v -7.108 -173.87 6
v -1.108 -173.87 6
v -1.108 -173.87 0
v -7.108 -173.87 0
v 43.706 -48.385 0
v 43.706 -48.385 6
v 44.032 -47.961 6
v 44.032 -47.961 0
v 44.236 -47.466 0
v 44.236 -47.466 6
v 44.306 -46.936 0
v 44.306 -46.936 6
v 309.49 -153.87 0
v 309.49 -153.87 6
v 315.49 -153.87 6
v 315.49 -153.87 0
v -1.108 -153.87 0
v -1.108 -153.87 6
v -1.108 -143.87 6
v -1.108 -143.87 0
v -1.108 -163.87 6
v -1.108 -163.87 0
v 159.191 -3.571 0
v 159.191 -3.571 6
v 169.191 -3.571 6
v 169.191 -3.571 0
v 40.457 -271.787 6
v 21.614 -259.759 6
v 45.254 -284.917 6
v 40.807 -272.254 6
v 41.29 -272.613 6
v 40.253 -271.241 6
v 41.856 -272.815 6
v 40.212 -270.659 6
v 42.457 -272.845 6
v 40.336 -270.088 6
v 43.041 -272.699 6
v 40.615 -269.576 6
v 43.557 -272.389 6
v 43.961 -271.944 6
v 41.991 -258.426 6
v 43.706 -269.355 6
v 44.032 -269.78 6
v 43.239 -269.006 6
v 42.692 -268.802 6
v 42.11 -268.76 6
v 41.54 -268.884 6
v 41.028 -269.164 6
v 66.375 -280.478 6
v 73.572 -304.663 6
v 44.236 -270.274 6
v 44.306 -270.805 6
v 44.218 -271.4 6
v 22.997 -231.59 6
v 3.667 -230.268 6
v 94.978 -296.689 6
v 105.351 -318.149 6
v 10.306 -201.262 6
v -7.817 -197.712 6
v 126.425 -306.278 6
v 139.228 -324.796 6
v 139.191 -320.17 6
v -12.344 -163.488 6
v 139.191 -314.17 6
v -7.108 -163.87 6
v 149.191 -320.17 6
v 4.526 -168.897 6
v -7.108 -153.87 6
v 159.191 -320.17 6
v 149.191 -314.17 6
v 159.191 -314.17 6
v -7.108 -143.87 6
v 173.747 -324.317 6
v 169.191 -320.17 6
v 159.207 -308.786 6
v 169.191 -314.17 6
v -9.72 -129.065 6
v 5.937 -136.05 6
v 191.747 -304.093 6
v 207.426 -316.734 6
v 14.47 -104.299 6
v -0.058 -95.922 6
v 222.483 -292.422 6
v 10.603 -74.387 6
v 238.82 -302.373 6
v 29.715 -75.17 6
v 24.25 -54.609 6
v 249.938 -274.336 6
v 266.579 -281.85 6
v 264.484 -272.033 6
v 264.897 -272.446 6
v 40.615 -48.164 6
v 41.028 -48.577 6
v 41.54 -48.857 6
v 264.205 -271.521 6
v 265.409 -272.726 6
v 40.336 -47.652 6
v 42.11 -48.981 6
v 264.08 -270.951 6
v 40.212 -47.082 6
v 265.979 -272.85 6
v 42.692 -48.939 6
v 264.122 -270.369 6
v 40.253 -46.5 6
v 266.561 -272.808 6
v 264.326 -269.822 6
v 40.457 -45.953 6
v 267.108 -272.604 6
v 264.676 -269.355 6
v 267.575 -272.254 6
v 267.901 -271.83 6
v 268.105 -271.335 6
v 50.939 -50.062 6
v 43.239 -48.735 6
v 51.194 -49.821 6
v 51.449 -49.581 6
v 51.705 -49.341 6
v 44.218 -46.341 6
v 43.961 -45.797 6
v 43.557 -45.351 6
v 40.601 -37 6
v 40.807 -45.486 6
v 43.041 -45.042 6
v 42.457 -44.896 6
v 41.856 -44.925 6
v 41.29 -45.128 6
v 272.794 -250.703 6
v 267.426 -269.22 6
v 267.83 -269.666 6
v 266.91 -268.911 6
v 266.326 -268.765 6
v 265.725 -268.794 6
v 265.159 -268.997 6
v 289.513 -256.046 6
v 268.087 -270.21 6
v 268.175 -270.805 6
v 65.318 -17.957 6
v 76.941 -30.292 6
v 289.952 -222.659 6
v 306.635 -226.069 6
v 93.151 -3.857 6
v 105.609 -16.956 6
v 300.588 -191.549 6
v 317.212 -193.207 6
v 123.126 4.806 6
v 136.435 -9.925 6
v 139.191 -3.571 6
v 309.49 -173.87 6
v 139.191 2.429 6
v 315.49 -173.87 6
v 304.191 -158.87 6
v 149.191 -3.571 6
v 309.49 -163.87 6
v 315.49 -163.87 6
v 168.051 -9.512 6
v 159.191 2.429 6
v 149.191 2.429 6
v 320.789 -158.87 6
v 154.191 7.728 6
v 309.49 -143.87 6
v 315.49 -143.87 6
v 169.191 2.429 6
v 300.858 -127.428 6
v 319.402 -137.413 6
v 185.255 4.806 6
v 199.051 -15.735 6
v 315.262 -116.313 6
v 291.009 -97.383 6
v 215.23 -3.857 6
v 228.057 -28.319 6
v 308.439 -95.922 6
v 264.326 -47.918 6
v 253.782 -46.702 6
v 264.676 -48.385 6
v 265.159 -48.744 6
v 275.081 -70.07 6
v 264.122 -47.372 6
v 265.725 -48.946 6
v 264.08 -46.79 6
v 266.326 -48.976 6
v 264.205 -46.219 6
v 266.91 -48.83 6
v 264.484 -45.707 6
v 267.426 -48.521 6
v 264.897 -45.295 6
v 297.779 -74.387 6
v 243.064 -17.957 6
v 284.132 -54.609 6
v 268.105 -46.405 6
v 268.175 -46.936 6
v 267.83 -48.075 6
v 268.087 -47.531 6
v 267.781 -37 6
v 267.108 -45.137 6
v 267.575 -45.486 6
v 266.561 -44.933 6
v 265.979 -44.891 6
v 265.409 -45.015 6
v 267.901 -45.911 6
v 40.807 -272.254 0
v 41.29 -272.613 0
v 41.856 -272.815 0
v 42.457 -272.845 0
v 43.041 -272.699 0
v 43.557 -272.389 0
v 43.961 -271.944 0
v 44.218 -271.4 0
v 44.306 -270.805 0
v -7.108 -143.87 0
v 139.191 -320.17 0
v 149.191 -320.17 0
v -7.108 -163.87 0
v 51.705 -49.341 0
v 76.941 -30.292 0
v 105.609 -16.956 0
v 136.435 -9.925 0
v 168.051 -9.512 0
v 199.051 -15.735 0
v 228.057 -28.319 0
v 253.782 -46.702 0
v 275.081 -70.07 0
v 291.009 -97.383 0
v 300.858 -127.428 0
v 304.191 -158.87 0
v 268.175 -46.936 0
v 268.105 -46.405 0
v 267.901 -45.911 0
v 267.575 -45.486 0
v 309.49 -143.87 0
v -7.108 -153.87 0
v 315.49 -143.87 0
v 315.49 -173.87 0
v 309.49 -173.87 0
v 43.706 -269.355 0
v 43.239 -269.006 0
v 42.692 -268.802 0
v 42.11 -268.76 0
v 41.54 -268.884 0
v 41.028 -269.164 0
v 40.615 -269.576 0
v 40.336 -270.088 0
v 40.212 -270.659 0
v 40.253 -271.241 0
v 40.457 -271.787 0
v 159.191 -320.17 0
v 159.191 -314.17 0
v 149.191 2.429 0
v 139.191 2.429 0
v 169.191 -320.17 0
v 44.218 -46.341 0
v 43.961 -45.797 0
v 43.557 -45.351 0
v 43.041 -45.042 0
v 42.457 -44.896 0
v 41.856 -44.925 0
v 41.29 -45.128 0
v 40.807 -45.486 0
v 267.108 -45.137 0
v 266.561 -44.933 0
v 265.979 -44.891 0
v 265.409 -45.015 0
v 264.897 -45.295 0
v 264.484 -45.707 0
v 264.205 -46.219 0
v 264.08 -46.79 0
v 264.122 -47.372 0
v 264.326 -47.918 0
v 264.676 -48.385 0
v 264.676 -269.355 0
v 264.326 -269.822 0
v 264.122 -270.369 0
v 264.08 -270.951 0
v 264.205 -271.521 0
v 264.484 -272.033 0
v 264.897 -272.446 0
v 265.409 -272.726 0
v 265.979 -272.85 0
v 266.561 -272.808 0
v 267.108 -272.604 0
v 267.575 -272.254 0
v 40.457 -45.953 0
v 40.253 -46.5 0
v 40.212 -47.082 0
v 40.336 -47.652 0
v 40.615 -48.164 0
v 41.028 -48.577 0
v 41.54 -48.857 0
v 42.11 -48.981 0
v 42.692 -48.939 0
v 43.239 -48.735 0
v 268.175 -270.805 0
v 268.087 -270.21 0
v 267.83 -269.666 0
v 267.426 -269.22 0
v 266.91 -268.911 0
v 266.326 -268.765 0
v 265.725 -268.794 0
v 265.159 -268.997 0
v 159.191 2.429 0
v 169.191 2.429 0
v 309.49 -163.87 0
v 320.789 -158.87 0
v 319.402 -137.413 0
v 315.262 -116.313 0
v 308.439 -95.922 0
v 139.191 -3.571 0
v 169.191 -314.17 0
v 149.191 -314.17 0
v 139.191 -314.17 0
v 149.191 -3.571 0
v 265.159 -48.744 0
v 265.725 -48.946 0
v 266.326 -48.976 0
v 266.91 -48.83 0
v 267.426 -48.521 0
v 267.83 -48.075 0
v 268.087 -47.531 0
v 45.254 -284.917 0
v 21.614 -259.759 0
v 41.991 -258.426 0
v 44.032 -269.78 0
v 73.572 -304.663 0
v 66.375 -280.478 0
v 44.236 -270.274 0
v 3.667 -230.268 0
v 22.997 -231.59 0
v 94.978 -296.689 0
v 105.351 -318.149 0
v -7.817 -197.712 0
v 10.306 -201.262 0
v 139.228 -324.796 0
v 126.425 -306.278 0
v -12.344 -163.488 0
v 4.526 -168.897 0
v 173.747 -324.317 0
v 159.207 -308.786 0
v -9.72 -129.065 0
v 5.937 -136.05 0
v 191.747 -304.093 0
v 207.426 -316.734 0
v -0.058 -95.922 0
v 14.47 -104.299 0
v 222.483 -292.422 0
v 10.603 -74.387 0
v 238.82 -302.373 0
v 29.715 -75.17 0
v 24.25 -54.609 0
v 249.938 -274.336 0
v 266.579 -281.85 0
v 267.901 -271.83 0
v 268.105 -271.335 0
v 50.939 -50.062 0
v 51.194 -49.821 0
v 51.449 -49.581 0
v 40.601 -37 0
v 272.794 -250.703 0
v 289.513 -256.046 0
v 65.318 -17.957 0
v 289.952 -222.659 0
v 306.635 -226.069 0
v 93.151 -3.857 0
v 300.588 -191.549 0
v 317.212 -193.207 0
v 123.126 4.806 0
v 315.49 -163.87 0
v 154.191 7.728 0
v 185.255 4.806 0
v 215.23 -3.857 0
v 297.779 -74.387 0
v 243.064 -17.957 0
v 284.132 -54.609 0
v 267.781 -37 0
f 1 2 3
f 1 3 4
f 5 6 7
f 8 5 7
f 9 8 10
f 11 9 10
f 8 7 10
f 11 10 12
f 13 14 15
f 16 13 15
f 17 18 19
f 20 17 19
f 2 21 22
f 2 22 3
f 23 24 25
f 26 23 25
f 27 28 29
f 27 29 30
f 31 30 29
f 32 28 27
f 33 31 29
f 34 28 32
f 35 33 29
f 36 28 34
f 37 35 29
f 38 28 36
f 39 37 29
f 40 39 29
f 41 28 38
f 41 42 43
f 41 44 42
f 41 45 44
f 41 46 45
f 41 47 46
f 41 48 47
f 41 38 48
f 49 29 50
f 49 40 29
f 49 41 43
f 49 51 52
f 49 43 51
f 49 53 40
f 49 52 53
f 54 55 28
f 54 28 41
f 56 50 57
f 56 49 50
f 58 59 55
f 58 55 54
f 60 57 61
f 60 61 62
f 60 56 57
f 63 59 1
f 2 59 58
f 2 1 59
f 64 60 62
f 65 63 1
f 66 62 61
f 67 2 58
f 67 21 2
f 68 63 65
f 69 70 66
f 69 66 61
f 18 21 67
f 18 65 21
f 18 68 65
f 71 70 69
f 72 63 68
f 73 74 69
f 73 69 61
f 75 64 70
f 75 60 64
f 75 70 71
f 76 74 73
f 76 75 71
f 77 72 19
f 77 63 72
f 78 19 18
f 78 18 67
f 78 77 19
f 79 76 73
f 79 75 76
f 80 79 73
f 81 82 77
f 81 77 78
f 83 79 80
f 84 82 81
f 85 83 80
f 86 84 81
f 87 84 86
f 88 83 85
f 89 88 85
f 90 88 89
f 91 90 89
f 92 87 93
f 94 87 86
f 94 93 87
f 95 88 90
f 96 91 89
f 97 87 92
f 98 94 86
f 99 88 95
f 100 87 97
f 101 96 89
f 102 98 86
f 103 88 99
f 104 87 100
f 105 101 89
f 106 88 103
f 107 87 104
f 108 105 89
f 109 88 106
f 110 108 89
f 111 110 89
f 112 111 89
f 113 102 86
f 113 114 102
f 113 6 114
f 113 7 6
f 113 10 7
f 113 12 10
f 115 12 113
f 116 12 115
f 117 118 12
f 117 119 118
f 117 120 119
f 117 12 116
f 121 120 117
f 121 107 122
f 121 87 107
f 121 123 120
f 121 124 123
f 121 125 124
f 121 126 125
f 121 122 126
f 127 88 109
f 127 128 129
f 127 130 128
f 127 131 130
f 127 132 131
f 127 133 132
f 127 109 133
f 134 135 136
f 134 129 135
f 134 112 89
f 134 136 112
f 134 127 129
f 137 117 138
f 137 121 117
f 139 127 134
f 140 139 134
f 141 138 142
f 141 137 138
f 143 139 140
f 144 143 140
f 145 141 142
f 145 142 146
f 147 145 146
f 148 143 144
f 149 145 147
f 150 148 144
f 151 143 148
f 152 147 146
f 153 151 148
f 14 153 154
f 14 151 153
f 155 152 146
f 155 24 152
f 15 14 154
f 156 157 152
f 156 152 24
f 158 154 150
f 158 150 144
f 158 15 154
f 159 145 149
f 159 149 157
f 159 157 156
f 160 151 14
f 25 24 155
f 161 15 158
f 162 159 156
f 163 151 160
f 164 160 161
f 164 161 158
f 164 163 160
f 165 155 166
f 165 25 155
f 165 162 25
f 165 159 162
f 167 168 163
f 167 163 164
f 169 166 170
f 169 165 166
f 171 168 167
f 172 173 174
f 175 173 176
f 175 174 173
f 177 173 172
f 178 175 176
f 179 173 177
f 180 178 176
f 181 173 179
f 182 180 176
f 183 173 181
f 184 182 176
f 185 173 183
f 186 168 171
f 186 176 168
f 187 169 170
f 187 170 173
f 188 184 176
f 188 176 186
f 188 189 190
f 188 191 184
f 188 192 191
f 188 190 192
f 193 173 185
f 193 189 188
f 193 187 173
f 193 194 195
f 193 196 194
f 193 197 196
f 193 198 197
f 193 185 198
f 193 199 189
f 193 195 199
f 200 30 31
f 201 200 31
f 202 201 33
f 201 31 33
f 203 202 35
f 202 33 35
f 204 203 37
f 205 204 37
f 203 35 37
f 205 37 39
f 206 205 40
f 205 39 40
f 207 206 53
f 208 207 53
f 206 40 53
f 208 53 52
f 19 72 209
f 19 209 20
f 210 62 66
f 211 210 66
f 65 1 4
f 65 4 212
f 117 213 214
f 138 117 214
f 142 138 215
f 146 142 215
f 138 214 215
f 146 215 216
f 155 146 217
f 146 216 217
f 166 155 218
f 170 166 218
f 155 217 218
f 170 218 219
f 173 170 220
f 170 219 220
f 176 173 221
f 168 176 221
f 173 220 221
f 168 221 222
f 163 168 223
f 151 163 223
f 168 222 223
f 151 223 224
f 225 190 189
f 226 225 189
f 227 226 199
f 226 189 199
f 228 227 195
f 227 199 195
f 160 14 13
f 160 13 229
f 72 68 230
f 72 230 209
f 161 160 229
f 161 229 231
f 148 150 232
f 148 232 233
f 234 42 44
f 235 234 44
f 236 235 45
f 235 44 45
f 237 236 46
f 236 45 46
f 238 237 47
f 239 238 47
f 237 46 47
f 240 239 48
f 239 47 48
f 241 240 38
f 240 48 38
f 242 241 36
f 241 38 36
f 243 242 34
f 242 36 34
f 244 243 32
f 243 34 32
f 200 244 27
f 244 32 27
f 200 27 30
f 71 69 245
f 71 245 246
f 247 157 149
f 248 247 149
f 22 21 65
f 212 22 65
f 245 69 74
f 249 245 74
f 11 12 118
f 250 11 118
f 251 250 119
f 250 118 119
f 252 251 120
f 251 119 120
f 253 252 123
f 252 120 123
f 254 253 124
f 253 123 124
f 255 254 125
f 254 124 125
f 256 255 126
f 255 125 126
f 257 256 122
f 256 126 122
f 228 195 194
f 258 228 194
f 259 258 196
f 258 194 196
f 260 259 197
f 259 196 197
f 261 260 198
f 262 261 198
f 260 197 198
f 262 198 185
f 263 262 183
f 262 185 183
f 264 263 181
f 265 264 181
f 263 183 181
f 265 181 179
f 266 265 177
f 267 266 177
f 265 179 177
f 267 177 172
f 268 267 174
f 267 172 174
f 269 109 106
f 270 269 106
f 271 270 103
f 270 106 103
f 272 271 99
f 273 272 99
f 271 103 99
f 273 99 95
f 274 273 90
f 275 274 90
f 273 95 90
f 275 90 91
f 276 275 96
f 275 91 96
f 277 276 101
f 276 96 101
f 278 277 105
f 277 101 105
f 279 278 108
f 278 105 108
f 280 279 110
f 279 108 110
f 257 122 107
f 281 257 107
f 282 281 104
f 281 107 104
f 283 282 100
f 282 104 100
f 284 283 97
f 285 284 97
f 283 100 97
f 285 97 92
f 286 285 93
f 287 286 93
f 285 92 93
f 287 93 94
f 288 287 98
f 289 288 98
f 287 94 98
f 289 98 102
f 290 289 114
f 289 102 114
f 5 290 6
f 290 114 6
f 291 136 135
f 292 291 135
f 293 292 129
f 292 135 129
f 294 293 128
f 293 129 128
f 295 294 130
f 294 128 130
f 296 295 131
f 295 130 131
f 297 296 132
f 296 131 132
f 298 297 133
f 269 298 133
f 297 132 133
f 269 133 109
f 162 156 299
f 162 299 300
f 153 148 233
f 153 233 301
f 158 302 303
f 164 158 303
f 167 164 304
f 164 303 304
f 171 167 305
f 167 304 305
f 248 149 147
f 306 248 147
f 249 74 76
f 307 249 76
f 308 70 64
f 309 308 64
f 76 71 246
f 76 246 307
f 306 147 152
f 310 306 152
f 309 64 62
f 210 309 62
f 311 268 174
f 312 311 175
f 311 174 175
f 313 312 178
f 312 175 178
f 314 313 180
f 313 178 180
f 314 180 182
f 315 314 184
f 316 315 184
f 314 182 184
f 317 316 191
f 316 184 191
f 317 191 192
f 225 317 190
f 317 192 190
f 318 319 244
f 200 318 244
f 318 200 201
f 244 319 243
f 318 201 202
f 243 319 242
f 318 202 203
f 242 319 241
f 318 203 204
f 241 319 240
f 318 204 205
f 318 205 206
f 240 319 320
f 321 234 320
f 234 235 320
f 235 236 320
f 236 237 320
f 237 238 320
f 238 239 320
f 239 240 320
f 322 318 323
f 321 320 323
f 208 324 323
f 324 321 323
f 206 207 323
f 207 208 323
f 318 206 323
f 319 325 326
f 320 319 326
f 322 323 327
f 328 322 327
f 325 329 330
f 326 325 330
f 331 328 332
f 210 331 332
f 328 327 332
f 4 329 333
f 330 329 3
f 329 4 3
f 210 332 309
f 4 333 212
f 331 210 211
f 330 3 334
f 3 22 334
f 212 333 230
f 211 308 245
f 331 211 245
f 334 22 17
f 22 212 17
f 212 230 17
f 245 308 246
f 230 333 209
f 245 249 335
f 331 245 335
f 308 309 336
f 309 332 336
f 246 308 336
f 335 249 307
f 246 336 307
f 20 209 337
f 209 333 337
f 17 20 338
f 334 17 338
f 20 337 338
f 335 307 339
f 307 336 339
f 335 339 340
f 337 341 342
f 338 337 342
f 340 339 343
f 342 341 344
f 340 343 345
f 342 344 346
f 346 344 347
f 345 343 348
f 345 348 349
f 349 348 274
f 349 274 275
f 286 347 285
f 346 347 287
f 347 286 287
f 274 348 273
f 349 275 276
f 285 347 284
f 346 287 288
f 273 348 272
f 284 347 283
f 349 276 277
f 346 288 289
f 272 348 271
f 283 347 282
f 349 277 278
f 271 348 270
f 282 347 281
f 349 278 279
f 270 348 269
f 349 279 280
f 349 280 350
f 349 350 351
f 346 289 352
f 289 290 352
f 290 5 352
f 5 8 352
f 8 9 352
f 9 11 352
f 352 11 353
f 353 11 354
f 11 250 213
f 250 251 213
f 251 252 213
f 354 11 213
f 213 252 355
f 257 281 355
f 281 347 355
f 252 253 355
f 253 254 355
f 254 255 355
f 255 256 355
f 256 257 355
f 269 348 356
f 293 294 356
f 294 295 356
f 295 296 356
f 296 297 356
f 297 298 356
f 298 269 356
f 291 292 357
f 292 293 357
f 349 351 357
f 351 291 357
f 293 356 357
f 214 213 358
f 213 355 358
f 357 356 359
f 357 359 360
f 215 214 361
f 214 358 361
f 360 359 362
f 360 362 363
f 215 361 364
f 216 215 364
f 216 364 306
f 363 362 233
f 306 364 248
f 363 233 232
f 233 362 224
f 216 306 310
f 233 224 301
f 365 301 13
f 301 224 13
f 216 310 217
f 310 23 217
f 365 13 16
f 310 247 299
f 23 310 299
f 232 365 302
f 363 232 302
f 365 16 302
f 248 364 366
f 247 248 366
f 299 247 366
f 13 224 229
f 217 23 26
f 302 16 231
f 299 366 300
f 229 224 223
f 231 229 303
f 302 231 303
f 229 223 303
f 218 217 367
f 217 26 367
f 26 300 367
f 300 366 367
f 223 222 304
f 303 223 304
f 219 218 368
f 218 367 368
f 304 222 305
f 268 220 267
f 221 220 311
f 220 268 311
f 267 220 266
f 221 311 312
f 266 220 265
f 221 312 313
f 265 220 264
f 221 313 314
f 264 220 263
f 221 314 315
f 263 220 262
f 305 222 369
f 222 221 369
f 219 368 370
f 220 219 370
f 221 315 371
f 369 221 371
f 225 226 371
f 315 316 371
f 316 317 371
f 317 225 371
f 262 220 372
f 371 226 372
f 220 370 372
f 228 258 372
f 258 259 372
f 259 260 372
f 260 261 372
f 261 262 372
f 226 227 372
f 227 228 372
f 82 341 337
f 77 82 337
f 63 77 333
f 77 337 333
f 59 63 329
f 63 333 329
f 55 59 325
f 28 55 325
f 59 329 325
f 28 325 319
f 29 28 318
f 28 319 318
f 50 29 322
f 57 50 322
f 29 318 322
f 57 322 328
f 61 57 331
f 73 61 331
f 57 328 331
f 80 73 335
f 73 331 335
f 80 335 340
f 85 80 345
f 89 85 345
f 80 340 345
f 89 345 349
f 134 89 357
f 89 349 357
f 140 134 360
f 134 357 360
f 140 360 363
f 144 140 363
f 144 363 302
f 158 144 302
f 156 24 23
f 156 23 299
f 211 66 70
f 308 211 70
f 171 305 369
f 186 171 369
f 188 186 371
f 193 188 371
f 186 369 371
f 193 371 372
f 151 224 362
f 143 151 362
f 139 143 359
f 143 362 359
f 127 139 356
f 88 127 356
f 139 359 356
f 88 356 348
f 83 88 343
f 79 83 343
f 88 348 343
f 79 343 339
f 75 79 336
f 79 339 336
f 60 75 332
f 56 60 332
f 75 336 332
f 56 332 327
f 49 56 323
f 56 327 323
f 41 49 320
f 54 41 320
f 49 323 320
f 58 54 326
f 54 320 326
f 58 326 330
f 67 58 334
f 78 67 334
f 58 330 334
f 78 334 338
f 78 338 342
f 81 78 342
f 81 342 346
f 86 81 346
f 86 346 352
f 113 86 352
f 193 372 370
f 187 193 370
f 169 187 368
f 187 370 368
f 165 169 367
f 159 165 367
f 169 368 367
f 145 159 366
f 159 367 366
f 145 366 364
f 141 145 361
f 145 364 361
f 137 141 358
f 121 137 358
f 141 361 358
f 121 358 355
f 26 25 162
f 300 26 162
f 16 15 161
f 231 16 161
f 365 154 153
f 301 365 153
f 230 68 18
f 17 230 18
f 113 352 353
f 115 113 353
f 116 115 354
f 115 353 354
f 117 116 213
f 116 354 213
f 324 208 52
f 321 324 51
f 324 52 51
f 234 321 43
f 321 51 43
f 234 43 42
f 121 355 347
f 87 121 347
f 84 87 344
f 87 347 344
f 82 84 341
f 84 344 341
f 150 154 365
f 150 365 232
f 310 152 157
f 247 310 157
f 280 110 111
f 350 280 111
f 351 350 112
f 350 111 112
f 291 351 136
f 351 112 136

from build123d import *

# Parameters (mm, degrees)
SALIENTE_EXTRUIR1_DEPTH = 6
CROQUIS2_W              = 10
CROQUIS2_H              = 6
CROQUIS2_W_2            = 6
CROQUIS2_H_2            = 10
CORTAR_EXTRUIR1_DEPTH   = 10


with BuildPart() as part:
    # Croquis1 → Saliente-Extruir1 (new body)
    with BuildSketch(Plane.XY):
        with BuildLine():
            ThreePointArc((40.600971411, -36.999917491), (17.069259083, -64.251458669), (-0.057755376, -95.922476295))
            ThreePointArc((-0.057755376, -95.922476295), (122.116838757, -322.352188967), (320.78926855, -158.870349387))
            ThreePointArc((320.78926855, -158.870349387), (317.672636714, -126.79639101), (308.439349644, -95.922476295))
            ThreePointArc((308.439349644, -95.922476295), (291.312335185, -64.251458669), (267.780622857, -36.999917491))
            ThreePointArc((267.780622857, -36.999917491), (154.190797134, 7.728122029), (40.600971411, -36.999917491))
        make_face()
        with BuildLine():
            ThreePointArc((50.939396199, -50.062499464), (51.321581101, -49.701102835), (51.705030941, -49.341048614))
            ThreePointArc((51.705030941, -49.341048614), (213.886421224, -21.26063874), (304.190797134, -158.870349387))
            ThreePointArc((304.190797134, -158.870349387), (94.978087942, -296.688545102), (50.939396199, -50.062499464))
        make_face(mode=Mode.SUBTRACT)
    extrude(amount=SALIENTE_EXTRUIR1_DEPTH)

    # Croquis2 → Cortar-Extruir1 (cut)
    with BuildSketch(Plane.XY.offset(6)):
        Polygon((139.190797134, -3.571113679), (149.190797134, -3.571113679), (149.190797134, -0.571113679), (149.190797134, 2.428886321), (139.190797134, 2.428886321), align=None)
        with Locations((164.190797134, -0.571113679)):
            Rectangle(CROQUIS2_W, CROQUIS2_H)
        with Locations((312.490032842, -148.870349387)):
            Rectangle(CROQUIS2_W_2, CROQUIS2_H_2)
        Polygon((312.490032842, -163.870349387), (315.490032842, -163.870349387), (315.490032842, -173.870349387), (309.490032842, -173.870349387), (309.490032842, -163.870349387), align=None)
        with Locations((164.190797134, -317.169585095)):
            Rectangle(CROQUIS2_W, CROQUIS2_H)
        Polygon((149.190797134, -317.169585095), (149.190797134, -314.169585095), (139.190797134, -314.169585095), (139.190797134, -320.169585095), (149.190797134, -320.169585095), align=None)
        with Locations((-4.108438574, -148.870349387)):
            Rectangle(CROQUIS2_W_2, CROQUIS2_H_2)
        Polygon((-7.108438574, -173.870349387), (-7.108438574, -163.870349387), (-4.108438574, -163.870349387), (-1.108438574, -163.870349387), (-1.108438574, -173.870349387), align=None)
        with BuildLine():
            ThreePointArc((40.806765207, -45.48631746), (40.806765207, -48.385455263), (43.705903009, -48.385455263))
            Line((43.705903009, -48.385455263), (40.806765207, -45.48631746))
        make_face()
        with BuildLine():
            Line((40.806765207, -45.48631746), (43.705903009, -48.385455263))
            ThreePointArc((43.705903009, -48.385455263), (44.15028715, -47.720387398), (44.306334108, -46.935886361))
            ThreePointArc((44.306334108, -46.935886361), (43.040835144, -45.04193332), (40.806765207, -45.48631746))
        make_face()
        with BuildLine():
            ThreePointArc((267.574829061, -45.48631746), (264.675691258, -45.48631746), (264.675691258, -48.385455263))
            Line((264.675691258, -48.385455263), (267.574829061, -45.48631746))
        make_face()
        with BuildLine():
            Line((267.574829061, -45.48631746), (264.675691258, -48.385455263))
            ThreePointArc((264.675691258, -48.385455263), (266.909761196, -48.829839403), (268.17526016, -46.935886361))
            ThreePointArc((268.17526016, -46.935886361), (268.019213202, -46.151385325), (267.574829061, -45.48631746))
        make_face()
        with BuildLine():
            ThreePointArc((268.17526016, -270.804812413), (266.909761196, -268.910859371), (264.675691258, -269.355243512))
            Line((264.675691258, -269.355243512), (267.574829061, -272.254381314))
            ThreePointArc((267.574829061, -272.254381314), (268.019213202, -271.589313449), (268.17526016, -270.804812413))
        make_face()
        with BuildLine():
            Line((267.574829061, -272.254381314), (264.675691258, -269.355243512))
            ThreePointArc((264.675691258, -269.355243512), (264.675691258, -272.254381314), (267.574829061, -272.254381314))
        make_face()
        with BuildLine():
            ThreePointArc((44.306334108, -270.804812413), (44.15028715, -270.020311377), (43.705903009, -269.355243512))
            Line((43.705903009, -269.355243512), (40.806765207, -272.254381314))
            ThreePointArc((40.806765207, -272.254381314), (43.040835144, -272.698765455), (44.306334108, -270.804812413))
        make_face()
        with BuildLine():
            Line((40.806765207, -272.254381314), (43.705903009, -269.355243512))
            ThreePointArc((43.705903009, -269.355243512), (40.806765207, -269.355243512), (40.806765207, -272.254381314))
        make_face()
    extrude(amount=-CORTAR_EXTRUIR1_DEPTH, mode=Mode.SUBTRACT)


solid = part.part
